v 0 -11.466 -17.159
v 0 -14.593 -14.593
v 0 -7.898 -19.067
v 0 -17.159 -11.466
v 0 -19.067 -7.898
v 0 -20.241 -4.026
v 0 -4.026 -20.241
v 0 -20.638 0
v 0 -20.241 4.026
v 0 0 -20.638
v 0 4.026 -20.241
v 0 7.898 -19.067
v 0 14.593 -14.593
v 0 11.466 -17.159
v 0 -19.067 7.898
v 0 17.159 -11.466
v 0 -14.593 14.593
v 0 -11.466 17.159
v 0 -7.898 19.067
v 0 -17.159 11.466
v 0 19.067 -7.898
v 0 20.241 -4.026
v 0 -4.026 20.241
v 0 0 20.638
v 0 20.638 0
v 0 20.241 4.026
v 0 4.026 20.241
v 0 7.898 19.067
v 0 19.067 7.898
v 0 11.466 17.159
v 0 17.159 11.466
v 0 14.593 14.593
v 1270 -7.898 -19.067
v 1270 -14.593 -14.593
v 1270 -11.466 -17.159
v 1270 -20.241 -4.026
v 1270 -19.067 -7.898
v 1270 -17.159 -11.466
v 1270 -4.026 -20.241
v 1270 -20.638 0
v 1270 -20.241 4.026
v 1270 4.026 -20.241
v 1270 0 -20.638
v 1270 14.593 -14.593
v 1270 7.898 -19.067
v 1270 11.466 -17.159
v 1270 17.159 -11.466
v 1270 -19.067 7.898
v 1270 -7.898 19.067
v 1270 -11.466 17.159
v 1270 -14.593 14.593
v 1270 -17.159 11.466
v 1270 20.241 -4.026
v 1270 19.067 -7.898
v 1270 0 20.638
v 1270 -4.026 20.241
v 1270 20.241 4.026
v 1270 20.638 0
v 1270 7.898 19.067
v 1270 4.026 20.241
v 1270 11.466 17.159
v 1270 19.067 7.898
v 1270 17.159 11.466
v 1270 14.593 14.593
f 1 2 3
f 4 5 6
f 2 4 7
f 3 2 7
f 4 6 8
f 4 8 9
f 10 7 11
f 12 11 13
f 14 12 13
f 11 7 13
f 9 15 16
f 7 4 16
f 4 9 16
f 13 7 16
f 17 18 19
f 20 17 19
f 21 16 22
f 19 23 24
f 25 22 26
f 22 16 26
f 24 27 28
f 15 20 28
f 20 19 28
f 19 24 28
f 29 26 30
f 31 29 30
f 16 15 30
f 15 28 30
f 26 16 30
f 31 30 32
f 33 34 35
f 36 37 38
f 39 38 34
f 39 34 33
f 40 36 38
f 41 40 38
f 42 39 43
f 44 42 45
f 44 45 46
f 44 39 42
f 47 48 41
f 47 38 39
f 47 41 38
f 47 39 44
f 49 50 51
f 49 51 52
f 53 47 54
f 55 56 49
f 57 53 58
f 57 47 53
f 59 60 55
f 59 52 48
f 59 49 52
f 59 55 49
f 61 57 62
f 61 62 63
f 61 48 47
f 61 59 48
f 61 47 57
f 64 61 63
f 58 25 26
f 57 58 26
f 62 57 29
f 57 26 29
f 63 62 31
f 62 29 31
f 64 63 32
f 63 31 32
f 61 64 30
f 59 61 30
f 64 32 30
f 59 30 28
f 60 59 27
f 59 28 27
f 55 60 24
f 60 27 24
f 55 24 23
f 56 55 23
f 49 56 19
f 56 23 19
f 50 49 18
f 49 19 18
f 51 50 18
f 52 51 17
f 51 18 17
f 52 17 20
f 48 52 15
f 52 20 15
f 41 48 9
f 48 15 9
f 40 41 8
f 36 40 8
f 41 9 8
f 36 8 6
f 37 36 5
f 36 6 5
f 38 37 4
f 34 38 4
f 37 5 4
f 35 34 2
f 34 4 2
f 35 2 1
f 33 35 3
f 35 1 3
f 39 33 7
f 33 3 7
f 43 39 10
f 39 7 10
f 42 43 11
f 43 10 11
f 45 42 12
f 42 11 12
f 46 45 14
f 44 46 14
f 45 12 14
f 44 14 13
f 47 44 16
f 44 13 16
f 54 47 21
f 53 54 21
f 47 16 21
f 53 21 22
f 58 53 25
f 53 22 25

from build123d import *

# Parameters (mm, degrees)
F0_R     = 20.6375
F1_DEPTH = 1219.2
F3_R     = 20.6375
F4_DEPTH = 1270


with BuildPart() as f1:
    # F0 (on Front) → F1 (new body)
    with BuildSketch(Plane.XZ):
        Circle(F0_R)
    extrude(amount=F1_DEPTH)


with BuildPart() as f4:
    # F3 (on Right) → F4 (new body)
    with BuildSketch(Plane.YZ):
        Circle(F3_R)
    extrude(amount=F4_DEPTH)


solid = f4.part
